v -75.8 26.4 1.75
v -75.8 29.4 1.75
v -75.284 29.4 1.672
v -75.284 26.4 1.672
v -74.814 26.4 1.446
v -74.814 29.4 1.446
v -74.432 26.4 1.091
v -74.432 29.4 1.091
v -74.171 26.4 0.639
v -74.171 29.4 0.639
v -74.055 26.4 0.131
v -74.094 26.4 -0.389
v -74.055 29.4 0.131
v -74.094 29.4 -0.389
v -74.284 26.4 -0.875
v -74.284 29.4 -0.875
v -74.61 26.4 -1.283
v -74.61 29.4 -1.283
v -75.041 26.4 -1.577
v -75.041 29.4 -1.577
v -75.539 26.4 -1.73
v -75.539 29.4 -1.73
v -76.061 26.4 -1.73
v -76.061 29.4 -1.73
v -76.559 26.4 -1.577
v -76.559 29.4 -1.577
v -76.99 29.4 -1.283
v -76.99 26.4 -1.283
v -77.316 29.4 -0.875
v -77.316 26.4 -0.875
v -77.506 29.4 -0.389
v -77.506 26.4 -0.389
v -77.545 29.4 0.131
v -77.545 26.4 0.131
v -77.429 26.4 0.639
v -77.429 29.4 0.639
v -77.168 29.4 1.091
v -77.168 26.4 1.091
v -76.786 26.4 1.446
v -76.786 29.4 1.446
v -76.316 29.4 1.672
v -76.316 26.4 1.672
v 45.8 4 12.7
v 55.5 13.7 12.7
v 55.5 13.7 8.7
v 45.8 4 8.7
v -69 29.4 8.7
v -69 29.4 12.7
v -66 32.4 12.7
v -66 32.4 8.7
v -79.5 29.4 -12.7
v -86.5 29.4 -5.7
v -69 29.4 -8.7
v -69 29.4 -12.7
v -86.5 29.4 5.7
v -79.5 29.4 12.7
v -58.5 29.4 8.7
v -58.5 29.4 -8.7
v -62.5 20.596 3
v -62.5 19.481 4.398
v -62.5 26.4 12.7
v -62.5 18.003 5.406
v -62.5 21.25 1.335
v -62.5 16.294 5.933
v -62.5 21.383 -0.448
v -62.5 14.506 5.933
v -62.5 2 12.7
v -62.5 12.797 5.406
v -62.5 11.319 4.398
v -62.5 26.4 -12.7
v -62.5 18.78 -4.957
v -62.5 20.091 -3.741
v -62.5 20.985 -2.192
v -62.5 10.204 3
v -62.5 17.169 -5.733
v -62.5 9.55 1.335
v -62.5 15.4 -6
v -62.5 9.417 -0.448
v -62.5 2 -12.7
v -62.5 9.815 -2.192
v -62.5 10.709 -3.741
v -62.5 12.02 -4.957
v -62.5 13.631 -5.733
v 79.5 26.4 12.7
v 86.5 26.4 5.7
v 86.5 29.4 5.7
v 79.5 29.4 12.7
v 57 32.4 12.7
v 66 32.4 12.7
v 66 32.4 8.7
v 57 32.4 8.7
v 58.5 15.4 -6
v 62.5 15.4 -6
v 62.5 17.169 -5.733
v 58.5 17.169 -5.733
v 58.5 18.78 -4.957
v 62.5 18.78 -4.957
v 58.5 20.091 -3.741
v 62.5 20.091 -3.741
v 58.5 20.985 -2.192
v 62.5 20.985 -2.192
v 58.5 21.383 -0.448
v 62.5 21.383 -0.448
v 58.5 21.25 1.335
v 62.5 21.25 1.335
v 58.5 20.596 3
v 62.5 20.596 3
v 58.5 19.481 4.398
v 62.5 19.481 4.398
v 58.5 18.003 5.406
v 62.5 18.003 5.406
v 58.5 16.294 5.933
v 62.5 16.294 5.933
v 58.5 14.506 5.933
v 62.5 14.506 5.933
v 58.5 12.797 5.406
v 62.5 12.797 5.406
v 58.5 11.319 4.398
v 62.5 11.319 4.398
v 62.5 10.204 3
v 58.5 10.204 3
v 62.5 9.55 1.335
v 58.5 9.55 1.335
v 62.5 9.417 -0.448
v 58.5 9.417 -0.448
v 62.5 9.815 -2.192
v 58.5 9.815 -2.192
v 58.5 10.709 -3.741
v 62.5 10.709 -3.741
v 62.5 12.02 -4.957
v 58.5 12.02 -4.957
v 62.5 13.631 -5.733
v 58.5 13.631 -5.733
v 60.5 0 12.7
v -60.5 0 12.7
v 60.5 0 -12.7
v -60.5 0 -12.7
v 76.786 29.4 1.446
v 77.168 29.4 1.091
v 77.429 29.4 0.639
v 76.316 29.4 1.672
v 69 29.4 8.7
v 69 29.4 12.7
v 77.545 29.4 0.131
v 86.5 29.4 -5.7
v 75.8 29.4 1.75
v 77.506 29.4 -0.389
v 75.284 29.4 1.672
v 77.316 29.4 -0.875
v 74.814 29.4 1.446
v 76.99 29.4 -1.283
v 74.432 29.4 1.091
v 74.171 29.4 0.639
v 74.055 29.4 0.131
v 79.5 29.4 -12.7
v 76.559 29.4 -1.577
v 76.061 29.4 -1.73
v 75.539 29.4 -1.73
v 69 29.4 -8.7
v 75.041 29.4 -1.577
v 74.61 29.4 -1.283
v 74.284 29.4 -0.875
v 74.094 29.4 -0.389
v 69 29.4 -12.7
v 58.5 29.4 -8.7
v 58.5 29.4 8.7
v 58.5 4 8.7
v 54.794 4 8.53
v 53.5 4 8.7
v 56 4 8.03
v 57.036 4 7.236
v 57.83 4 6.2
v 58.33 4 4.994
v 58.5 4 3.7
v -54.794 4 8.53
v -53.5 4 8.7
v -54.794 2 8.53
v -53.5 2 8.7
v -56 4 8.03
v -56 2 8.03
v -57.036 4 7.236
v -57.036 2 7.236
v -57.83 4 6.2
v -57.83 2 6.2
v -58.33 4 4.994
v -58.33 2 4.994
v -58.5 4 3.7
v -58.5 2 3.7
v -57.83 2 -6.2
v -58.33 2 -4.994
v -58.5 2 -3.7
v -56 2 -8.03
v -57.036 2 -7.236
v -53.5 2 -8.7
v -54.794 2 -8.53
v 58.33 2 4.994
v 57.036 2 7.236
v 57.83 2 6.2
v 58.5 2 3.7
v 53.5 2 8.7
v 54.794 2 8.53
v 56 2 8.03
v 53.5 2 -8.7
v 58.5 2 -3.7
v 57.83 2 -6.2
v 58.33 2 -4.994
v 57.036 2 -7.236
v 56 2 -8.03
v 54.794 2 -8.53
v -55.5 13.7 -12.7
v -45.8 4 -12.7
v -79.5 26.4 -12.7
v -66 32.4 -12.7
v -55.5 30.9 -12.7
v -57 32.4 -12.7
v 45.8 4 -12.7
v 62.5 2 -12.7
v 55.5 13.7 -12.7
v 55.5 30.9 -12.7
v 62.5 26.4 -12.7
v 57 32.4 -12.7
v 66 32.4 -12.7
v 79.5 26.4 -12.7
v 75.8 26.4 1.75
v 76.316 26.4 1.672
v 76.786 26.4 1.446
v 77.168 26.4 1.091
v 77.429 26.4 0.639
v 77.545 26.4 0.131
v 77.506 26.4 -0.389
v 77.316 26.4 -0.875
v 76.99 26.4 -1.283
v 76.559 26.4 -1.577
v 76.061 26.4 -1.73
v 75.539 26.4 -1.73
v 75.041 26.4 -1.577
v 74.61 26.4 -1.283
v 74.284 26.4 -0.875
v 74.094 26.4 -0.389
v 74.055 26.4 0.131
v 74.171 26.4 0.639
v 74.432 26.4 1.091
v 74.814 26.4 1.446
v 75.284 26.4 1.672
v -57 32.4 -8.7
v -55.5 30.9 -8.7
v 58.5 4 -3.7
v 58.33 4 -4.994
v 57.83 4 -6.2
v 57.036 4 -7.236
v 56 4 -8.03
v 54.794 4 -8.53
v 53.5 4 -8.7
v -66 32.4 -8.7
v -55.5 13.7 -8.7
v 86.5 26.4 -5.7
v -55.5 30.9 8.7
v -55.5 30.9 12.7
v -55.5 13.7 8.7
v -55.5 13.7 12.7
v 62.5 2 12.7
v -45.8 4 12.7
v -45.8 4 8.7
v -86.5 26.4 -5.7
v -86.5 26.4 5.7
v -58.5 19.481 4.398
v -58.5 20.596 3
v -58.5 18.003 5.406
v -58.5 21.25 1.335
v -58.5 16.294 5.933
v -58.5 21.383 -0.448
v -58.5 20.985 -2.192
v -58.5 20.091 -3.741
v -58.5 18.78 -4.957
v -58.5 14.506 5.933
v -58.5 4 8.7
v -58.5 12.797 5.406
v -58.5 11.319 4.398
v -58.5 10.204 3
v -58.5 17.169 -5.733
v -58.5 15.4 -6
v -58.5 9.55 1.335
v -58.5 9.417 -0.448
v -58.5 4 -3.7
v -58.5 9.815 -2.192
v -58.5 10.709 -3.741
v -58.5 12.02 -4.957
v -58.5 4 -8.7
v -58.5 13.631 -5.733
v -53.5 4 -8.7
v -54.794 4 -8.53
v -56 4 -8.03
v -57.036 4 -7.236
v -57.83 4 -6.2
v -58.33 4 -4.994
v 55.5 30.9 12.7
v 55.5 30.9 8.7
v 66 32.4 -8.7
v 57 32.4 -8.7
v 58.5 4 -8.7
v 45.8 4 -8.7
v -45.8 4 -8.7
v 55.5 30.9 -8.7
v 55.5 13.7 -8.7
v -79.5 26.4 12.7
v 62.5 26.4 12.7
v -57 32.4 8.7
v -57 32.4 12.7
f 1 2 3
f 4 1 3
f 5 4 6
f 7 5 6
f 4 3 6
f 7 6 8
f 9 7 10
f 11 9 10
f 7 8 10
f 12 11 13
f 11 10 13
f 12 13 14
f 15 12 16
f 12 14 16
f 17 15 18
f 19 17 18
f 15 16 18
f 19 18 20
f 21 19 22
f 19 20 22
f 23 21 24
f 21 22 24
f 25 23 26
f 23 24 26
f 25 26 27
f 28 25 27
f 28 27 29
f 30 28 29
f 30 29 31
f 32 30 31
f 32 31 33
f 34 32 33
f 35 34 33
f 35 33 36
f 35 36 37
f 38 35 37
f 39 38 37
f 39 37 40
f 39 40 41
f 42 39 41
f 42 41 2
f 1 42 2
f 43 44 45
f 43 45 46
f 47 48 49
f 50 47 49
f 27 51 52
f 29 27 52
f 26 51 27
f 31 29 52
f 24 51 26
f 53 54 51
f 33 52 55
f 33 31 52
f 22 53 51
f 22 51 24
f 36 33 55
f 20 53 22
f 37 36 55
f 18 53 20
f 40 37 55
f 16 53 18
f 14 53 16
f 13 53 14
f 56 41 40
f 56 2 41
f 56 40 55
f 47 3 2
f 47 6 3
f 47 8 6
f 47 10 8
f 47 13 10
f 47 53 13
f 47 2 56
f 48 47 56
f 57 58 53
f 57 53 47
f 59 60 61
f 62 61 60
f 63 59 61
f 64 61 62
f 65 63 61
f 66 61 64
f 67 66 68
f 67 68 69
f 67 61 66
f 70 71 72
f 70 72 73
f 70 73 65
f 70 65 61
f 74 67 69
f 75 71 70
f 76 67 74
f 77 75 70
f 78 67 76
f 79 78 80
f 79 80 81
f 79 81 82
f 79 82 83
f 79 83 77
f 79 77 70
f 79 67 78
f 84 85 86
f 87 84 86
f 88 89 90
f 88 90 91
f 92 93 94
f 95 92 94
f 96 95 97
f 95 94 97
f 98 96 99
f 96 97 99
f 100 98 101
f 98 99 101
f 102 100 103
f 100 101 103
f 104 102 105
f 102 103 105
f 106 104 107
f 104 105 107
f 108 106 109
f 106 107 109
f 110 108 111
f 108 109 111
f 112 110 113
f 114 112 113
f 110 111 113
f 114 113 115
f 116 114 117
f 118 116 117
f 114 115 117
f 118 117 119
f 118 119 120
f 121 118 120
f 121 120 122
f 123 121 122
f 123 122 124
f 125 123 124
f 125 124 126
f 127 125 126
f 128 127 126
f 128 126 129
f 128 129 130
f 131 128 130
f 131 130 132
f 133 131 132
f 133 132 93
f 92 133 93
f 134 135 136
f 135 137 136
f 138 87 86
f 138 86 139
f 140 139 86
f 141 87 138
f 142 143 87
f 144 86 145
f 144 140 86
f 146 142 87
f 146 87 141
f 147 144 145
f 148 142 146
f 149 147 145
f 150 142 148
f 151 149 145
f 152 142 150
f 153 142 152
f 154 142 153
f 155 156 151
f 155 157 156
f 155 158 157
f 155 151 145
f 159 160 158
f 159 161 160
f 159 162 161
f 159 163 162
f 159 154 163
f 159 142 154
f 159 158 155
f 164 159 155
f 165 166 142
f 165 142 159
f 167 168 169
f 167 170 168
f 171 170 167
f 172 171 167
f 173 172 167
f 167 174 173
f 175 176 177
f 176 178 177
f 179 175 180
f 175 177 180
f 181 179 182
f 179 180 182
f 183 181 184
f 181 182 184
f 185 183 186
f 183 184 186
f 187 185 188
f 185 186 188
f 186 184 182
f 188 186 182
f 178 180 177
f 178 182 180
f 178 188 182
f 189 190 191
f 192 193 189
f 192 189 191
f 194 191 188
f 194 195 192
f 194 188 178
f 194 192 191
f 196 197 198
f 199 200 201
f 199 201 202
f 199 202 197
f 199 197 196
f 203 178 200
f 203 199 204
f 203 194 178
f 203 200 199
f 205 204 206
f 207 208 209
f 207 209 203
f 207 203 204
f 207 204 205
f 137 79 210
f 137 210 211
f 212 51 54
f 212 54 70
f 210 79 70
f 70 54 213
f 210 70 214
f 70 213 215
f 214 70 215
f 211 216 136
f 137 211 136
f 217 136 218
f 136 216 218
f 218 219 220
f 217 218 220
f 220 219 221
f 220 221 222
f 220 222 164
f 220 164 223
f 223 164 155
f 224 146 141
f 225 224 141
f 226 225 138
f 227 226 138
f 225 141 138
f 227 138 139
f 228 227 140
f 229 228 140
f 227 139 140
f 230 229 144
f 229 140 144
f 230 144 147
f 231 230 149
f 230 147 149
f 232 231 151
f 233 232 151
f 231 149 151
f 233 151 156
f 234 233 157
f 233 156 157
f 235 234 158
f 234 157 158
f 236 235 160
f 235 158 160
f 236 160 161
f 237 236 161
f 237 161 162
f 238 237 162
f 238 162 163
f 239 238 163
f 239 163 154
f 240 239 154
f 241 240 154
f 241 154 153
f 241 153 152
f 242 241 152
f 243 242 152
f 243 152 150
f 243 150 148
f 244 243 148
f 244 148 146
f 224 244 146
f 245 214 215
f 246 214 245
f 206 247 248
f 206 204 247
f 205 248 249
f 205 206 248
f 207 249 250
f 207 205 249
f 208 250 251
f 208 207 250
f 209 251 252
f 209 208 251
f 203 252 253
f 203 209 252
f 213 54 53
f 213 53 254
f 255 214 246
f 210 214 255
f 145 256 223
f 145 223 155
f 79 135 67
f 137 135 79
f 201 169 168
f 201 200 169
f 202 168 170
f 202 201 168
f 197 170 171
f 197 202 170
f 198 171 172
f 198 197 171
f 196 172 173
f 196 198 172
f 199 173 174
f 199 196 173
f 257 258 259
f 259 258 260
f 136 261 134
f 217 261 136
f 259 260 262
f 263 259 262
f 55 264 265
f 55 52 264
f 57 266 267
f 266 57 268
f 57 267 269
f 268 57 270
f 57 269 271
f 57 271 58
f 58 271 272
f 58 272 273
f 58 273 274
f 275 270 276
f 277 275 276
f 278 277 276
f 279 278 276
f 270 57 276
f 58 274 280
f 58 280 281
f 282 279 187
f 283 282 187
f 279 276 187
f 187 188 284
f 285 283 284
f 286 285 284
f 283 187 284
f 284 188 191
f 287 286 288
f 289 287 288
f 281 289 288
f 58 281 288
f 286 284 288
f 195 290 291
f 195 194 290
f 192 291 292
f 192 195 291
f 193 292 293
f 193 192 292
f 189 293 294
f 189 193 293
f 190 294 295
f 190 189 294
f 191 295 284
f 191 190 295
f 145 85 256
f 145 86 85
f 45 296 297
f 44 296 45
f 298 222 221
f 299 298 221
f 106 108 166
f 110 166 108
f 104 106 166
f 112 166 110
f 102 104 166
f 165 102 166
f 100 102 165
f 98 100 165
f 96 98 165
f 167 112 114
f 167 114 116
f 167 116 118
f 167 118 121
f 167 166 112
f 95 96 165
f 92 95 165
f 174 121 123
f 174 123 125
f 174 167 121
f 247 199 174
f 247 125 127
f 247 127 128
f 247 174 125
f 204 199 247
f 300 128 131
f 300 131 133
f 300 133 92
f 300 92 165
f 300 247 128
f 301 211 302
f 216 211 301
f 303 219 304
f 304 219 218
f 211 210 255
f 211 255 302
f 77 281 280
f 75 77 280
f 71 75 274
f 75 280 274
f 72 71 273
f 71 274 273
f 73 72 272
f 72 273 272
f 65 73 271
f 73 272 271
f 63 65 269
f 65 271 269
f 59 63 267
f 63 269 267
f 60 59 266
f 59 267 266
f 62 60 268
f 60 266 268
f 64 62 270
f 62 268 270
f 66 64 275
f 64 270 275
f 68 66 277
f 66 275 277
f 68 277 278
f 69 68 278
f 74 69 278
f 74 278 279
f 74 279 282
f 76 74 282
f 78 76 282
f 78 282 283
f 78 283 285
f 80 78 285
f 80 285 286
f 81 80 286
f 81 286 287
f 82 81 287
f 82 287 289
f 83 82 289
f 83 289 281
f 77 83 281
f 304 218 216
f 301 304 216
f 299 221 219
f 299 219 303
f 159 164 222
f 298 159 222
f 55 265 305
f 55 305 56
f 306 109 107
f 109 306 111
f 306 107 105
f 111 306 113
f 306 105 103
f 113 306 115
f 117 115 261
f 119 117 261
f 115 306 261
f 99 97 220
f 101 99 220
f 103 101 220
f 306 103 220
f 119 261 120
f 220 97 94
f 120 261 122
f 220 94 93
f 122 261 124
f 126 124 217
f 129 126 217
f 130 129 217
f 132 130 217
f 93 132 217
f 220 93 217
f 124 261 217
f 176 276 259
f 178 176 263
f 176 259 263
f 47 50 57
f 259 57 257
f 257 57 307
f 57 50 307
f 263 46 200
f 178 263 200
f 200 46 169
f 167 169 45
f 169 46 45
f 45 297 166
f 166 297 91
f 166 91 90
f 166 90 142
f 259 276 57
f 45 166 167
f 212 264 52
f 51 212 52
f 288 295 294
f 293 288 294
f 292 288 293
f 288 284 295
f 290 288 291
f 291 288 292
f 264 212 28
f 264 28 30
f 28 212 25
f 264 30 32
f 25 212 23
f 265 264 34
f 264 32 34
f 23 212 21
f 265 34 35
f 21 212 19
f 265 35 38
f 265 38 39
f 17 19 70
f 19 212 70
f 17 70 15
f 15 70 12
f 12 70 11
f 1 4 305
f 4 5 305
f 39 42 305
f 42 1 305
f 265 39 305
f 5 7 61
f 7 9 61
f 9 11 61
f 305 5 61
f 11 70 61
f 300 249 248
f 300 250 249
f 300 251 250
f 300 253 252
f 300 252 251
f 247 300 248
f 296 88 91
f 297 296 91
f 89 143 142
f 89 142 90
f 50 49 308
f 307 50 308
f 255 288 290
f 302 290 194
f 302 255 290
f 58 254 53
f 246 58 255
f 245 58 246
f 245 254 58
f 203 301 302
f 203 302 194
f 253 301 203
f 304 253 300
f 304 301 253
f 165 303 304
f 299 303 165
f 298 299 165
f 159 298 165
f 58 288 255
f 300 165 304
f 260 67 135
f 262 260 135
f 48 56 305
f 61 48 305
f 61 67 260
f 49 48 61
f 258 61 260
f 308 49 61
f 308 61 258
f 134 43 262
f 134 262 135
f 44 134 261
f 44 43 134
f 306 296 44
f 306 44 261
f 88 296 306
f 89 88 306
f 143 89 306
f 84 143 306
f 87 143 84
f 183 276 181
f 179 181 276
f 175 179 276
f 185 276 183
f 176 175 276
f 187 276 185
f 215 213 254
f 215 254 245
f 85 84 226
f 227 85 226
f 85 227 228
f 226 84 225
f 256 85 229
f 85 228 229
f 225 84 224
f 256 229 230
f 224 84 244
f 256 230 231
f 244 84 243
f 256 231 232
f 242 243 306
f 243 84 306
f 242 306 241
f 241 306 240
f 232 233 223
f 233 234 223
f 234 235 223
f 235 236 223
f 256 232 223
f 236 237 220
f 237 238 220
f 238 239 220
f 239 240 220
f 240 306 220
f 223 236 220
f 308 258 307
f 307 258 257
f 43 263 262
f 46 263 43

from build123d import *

# Parameters (mm, degrees)
SKETCH1_W           = 125
SKETCH1_H           = 25.4
BOSS_EXTRUDE1_DEPTH = 4
SKETCH2_W           = 117
SKETCH2_H           = 17.4
CUT_EXTRUDE1_DEPTH  = 2
FILLET1_R           = 5
SKETCH3_W           = 4
SKETCH3_H           = 25.4
BOSS_EXTRUDE2_DEPTH = 25.4
CHAMFER1_SIZE       = 2
SKETCH4_R           = 6
CUT_EXTRUDE3_DEPTH  = 135.4
SKETCH5_W           = 25.4
SKETCH5_H           = 3
BOSS_EXTRUDE3_DEPTH = 24
SKETCH6_W           = 25.4
SKETCH6_H           = 3
BOSS_EXTRUDE4_DEPTH = 24
BOSS_EXTRUDE5_DEPTH = 4
BOSS_EXTRUDE6_DEPTH = 4
SKETCH9_R           = 1.75
CUT_EXTRUDE4_DEPTH  = 4
CHAMFER2_SIZE       = 7
BOSS_EXTRUDE7_DEPTH = 4
BOSS_EXTRUDE8_DEPTH = 4
CHAMFER3_SIZE       = 1.5


with BuildPart() as part:
    # Sketch1 → Boss-Extrude1 (new body)
    with BuildSketch(Plane(origin=(0, 0, 0), x_dir=(1, 0, 0), z_dir=(0, 1, 0))):
        Rectangle(SKETCH1_W, SKETCH1_H)
    extrude(amount=BOSS_EXTRUDE1_DEPTH)

    # Sketch2 → Cut-Extrude1 (cut)
    with BuildSketch(Plane(origin=(0, 4, 0), x_dir=(1, 0, 0), z_dir=(0, 1, 0))):
        Rectangle(SKETCH2_W, SKETCH2_H)
    extrude(amount=-CUT_EXTRUDE1_DEPTH, mode=Mode.SUBTRACT)

    # Fillet1
    fillet1_edges = [part.edges().sort_by_distance(p)[0] for p in [
        (58.5, 3, -8.7),
        (58.5, 3, 8.7),
        (-58.5, 3, 8.7),
        (-58.5, 3, -8.7),
    ]]
    fillet(fillet1_edges, radius=FILLET1_R)

    # Sketch3 → Boss-Extrude2 (add)
    with BuildSketch(Plane(origin=(0, 4, 0), x_dir=(1, 0, 0), z_dir=(0, 1, 0))):
        with Locations((60.5, 0)):
            Rectangle(SKETCH3_W, SKETCH3_H)
        with Locations((-60.5, 0)):
            Rectangle(SKETCH3_W, SKETCH3_H)
    extrude(amount=BOSS_EXTRUDE2_DEPTH)

    # Chamfer1
    chamfer1_edges = [part.edges().sort_by_distance(p)[0] for p in [
        (-62.5, 0, 0),
        (62.5, 0, 0),
    ]]
    chamfer(chamfer1_edges, length=CHAMFER1_SIZE)

    # Sketch4 → Cut-Extrude3 (cut)
    with BuildSketch(Plane(origin=(62.5, 0, 0), x_dir=(0, 0, -1), z_dir=(1, 0, 0))):
        with Locations((0, 15.4)):
            Circle(SKETCH4_R)
    extrude(amount=-CUT_EXTRUDE3_DEPTH, mode=Mode.SUBTRACT)

    # Sketch5 → Boss-Extrude3 (add)
    with BuildSketch(Plane.ZY.offset(62.5)):
        with Locations((0, 27.9)):
            Rectangle(SKETCH5_W, SKETCH5_H)
    extrude(amount=BOSS_EXTRUDE3_DEPTH)

    # Sketch6 → Boss-Extrude4 (add)
    with BuildSketch(Plane(origin=(62.5, 0, 0), x_dir=(0, 0, -1), z_dir=(1, 0, 0))):
        with Locations((0, 27.9)):
            Rectangle(SKETCH6_W, SKETCH6_H)
    extrude(amount=BOSS_EXTRUDE4_DEPTH)

    # Sketch7 → Boss-Extrude5 (add)
    with BuildSketch(Plane.XY.offset(12.7)):
        Polygon((-58.5, 16.7), (-45.8, 4), (-58.5, 4), align=None)
        Polygon((58.5, 16.7), (45.8, 4), (58.5, 4), align=None)
    extrude(amount=-BOSS_EXTRUDE5_DEPTH)

    # Sketch8 → Boss-Extrude6 (add)
    with BuildSketch(Plane(origin=(0, 0, -12.7), x_dir=(-1, 0, 0), z_dir=(0, 0, -1))):
        Polygon((-58.5, 16.7), (-45.8, 4), (-58.5, 4), align=None)
        Polygon((58.5, 16.7), (45.8, 4), (58.5, 4), align=None)
    extrude(amount=-BOSS_EXTRUDE6_DEPTH)

    # Sketch9 → Cut-Extrude4 (cut)
    with BuildSketch(Plane(origin=(0, 29.4, 0), x_dir=(1, 0, 0), z_dir=(0, 1, 0))):
        with Locations(Location((75.8, 0, 0), (0, 0, 270))):
            Circle(SKETCH9_R)
        with Locations(Location((-75.8, 0, 0), (0, 0, 270))):
            Circle(SKETCH9_R)
    extrude(amount=-CUT_EXTRUDE4_DEPTH, mode=Mode.SUBTRACT)

    # Chamfer2
    chamfer2_edges = [part.edges().sort_by_distance(p)[0] for p in [
        (-86.5, 27.9, -12.7),
        (-86.5, 27.9, 12.7),
        (86.5, 27.9, 12.7),
        (86.5, 27.9, -12.7),
    ]]
    chamfer(chamfer2_edges, length=CHAMFER2_SIZE)

    # Sketch10 → Boss-Extrude7 (add)
    with BuildSketch(Plane(origin=(0, 0, -12.7), x_dir=(-1, 0, 0), z_dir=(0, 0, -1))):
        Polygon((-69, 29.4), (-66, 32.4), (-55.5, 32.4), (-55.5, 13.7), (-58.5, 16.7), (-58.5, 29.4), align=None)
        Polygon((69, 29.4), (66, 32.4), (55.5, 32.4), (55.5, 13.7), (58.5, 16.7), (58.5, 29.4), align=None)
    extrude(amount=-BOSS_EXTRUDE7_DEPTH)

    # Sketch11 → Boss-Extrude8 (add)
    with BuildSketch(Plane.XY.offset(12.7)):
        Polygon((69, 29.4), (66, 32.4), (55.5, 32.4), (55.5, 13.7), (58.5, 16.7), (58.5, 29.4), align=None)
        Polygon((-69, 29.4), (-66, 32.4), (-55.5, 32.4), (-55.5, 13.7), (-58.5, 16.7), (-58.5, 29.4), align=None)
    extrude(amount=-BOSS_EXTRUDE8_DEPTH)

    # Chamfer3
    chamfer3_edges = [part.edges().sort_by_distance(p)[0] for p in [
        (55.5, 32.4, -10.7),
        (-55.5, 32.4, -10.7),
        (55.5, 32.4, 10.7),
        (-55.5, 32.4, 10.7),
    ]]
    chamfer(chamfer3_edges, length=CHAMFER3_SIZE)


solid = part.part
